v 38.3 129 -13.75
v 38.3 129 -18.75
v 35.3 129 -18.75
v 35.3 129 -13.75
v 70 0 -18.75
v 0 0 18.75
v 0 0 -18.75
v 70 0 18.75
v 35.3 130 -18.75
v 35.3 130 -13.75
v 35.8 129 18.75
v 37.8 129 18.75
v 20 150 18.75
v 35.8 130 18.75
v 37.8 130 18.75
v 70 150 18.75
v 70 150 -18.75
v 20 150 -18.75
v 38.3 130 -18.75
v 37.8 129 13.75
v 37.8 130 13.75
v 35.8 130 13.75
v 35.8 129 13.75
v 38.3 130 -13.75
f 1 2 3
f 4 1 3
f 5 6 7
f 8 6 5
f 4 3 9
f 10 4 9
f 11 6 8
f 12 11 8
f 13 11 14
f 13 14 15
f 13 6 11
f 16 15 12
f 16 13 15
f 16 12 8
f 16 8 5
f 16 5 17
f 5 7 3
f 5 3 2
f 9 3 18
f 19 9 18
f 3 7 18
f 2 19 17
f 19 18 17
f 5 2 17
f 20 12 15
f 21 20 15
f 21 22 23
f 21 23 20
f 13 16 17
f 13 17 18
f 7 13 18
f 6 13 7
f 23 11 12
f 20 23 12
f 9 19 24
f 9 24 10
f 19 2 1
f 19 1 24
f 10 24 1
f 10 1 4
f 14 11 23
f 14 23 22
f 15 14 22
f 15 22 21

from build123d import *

# Parameters (mm, degrees)
BOSS_EXTRUDE2_DEPTH = 18.75
SKETCH2_W           = 3
SKETCH2_H           = 1
CUT_EXTRUDE1_DEPTH  = 5
SKETCH3_W           = 2
SKETCH3_H           = 1
CUT_EXTRUDE2_DEPTH  = 5


with BuildPart() as part:
    # Sketch1 → Boss-Extrude2 (new, symmetric)
    with BuildSketch(Plane.XY):
        Polygon((0, 0), (70, 0), (70, 150), (20, 150), align=None)
    extrude(amount=BOSS_EXTRUDE2_DEPTH, both=True)

    # Sketch2 → Cut-Extrude1 (cut)
    with BuildSketch(Plane(origin=(0, 0, -18.75), x_dir=(-1, 0, 0), z_dir=(0, 0, -1))):
        with Locations((-36.8, 129.5)):
            Rectangle(SKETCH2_W, SKETCH2_H)
    extrude(amount=-CUT_EXTRUDE1_DEPTH, mode=Mode.SUBTRACT)

    # Sketch3 → Cut-Extrude2 (cut)
    with BuildSketch(Plane.XY.offset(18.75)):
        with Locations((36.8, 129.5)):
            Rectangle(SKETCH3_W, SKETCH3_H)
    extrude(amount=-CUT_EXTRUDE2_DEPTH, mode=Mode.SUBTRACT)


solid = part.part
